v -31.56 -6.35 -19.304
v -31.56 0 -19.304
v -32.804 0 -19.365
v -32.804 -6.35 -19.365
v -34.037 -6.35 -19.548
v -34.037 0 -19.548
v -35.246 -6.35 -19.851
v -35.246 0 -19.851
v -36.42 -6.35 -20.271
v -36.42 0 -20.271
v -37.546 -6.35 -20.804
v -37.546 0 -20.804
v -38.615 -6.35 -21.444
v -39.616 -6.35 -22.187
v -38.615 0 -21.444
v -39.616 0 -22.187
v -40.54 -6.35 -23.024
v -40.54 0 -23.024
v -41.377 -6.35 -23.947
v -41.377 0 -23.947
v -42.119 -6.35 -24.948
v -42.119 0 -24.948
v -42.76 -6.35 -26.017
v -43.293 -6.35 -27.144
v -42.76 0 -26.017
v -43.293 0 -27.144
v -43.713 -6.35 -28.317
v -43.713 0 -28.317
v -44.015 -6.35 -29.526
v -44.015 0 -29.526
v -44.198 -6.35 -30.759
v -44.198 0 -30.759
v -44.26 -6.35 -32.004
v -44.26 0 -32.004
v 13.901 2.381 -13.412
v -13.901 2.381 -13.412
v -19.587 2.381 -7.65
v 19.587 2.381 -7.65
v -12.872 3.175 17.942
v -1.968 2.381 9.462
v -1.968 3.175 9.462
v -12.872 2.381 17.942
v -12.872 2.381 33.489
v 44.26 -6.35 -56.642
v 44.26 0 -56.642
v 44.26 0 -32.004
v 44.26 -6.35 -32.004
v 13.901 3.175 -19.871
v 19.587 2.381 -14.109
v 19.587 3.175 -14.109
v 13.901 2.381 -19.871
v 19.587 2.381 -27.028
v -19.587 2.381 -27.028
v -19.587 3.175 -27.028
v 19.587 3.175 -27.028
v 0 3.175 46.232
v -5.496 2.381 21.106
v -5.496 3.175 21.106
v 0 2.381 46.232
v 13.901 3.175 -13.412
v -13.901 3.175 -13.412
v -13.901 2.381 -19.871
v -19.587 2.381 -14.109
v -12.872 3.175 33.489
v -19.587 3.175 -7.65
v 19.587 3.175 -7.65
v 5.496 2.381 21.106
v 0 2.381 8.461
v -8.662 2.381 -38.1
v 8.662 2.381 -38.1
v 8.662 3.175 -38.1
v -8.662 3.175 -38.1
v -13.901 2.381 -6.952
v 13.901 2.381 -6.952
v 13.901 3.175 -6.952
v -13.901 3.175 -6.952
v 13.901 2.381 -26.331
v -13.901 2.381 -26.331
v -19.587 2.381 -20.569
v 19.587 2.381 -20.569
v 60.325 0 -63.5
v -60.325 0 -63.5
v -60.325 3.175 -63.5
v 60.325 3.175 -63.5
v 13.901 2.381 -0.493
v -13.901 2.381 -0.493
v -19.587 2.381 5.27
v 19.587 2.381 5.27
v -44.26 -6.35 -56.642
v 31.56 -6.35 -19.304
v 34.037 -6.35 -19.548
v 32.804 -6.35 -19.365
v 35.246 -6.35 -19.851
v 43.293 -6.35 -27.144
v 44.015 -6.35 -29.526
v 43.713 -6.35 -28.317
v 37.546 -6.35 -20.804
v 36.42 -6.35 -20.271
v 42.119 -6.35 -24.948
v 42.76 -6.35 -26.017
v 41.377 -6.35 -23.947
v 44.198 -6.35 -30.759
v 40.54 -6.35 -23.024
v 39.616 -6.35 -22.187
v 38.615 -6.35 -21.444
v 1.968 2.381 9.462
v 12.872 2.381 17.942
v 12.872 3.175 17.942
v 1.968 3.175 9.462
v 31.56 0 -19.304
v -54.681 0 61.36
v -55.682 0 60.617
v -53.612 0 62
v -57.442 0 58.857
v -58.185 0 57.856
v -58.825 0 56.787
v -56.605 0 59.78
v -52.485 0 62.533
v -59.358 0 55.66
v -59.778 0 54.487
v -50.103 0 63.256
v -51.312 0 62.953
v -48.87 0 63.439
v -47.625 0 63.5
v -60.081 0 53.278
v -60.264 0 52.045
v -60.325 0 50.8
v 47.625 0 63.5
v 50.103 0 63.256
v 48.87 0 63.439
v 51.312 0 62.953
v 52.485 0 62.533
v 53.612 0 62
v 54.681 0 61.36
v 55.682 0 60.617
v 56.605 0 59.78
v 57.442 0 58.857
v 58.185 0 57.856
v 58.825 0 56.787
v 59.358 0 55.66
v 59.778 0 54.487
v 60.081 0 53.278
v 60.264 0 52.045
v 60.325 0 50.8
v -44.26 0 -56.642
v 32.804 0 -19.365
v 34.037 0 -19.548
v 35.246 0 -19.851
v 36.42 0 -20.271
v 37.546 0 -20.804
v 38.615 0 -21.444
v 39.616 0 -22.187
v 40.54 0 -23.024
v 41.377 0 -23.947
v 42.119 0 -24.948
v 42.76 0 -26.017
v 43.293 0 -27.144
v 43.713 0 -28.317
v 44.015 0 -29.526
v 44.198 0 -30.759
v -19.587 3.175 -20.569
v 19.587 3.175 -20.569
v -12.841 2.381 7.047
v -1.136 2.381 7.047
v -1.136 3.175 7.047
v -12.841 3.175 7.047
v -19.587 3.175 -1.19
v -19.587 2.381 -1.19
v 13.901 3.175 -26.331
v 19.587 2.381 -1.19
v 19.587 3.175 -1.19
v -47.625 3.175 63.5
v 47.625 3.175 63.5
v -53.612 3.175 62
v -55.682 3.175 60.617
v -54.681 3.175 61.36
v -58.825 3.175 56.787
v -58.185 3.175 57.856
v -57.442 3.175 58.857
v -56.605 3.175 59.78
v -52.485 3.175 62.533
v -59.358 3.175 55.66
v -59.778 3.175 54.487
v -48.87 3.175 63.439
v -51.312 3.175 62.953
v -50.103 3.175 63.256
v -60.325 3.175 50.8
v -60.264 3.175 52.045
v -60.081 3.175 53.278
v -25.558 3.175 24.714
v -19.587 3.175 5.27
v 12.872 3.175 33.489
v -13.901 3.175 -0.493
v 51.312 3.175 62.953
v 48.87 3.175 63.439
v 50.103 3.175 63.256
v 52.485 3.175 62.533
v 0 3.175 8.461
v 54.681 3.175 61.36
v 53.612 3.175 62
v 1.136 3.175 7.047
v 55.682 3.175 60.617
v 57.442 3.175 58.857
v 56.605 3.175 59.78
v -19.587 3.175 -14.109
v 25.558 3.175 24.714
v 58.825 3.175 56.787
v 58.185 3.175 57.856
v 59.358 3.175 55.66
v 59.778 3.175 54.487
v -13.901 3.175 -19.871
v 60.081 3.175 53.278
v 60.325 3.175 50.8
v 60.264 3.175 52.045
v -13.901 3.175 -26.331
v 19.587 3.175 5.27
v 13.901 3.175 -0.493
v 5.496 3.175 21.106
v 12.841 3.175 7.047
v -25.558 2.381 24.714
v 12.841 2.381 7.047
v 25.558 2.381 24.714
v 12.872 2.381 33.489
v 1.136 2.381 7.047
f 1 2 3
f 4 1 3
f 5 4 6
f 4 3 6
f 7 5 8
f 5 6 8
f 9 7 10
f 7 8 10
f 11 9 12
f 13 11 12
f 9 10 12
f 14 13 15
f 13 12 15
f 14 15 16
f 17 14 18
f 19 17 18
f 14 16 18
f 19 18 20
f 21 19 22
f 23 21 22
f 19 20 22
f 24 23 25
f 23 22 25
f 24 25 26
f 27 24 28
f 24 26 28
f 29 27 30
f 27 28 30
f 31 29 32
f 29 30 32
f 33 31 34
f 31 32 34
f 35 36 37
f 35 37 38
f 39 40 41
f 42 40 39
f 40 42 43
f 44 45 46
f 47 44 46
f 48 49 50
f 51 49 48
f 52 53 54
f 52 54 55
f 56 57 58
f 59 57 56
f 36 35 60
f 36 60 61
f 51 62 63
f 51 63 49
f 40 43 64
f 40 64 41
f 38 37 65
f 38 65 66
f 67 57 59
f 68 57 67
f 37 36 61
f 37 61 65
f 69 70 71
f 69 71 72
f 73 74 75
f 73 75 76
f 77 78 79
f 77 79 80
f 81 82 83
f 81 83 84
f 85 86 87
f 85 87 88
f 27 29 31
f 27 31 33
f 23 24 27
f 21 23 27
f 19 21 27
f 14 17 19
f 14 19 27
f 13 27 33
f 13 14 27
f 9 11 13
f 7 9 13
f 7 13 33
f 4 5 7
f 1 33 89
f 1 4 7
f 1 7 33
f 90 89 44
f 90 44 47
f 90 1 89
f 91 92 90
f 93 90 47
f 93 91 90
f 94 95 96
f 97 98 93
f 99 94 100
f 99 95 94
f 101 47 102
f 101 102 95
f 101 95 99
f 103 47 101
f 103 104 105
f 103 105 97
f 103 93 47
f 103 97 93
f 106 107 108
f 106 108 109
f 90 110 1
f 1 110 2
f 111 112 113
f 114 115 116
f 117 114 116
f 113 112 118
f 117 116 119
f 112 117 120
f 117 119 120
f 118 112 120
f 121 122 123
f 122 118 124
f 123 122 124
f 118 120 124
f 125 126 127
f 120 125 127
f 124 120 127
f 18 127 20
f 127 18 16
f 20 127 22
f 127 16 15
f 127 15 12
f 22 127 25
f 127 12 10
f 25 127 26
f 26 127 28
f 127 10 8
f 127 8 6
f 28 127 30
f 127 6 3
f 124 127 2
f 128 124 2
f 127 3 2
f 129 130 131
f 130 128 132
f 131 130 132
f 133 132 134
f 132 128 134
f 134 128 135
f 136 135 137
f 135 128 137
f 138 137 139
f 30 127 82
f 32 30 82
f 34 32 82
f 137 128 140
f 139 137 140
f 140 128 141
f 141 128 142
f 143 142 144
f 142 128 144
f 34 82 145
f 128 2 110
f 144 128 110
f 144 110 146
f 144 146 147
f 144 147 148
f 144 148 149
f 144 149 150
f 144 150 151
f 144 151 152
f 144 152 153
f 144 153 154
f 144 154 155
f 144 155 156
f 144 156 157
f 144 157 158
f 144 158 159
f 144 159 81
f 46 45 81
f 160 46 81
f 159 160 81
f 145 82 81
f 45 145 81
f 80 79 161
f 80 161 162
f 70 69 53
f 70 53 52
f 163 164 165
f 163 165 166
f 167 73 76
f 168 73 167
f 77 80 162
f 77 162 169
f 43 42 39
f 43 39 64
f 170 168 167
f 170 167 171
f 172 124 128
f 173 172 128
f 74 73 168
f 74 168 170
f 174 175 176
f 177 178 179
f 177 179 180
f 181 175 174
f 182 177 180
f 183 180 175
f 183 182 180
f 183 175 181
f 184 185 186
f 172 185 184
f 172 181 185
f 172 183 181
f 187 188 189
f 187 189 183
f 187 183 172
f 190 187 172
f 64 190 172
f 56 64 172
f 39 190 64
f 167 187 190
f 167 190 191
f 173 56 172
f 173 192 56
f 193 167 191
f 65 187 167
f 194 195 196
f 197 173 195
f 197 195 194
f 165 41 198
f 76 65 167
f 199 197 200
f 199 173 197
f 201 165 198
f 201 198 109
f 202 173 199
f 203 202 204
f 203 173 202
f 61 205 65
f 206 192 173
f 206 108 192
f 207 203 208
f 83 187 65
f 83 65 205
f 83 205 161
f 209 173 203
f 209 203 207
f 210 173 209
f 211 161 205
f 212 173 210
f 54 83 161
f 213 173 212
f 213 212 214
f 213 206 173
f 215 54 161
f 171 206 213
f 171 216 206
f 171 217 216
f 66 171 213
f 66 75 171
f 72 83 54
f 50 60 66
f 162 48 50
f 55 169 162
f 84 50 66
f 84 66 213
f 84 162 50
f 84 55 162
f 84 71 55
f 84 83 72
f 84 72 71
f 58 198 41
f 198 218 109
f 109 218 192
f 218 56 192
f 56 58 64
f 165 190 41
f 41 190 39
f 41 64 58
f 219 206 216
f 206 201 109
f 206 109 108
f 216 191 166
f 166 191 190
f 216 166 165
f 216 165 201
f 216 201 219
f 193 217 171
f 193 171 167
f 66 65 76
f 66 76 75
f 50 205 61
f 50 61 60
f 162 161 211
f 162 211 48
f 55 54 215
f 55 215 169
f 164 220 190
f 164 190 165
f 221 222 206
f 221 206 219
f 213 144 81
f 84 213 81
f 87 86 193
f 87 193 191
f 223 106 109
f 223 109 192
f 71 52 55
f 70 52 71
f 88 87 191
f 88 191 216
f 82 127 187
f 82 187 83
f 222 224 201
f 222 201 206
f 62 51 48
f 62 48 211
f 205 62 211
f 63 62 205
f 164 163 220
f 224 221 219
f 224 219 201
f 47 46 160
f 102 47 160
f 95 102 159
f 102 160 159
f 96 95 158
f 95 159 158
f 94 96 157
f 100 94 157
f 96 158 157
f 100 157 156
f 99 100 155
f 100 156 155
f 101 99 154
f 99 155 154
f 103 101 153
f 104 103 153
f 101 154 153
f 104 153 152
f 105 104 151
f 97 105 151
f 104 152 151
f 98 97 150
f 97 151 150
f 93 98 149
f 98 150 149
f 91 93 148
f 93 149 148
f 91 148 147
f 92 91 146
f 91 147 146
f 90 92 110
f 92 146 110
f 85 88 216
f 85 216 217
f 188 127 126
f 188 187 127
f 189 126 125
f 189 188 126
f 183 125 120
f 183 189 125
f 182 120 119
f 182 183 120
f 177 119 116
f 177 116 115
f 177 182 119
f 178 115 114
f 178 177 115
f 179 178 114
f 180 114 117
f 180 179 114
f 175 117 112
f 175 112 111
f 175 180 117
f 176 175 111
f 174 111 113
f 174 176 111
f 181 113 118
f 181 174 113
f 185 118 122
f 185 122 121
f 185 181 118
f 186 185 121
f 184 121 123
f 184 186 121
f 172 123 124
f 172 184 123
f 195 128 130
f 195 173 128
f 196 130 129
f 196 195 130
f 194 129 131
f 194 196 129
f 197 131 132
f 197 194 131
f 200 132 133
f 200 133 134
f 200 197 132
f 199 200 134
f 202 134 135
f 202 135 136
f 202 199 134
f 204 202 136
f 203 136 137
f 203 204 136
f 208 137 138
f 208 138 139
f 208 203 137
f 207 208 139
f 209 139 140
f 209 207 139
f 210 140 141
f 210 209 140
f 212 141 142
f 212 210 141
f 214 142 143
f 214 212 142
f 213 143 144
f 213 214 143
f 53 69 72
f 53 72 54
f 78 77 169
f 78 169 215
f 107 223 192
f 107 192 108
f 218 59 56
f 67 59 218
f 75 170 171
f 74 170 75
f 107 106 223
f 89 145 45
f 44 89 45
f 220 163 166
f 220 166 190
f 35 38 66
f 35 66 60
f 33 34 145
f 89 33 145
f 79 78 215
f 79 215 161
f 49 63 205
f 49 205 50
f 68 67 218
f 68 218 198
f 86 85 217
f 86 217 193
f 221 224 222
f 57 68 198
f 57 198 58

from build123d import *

# Parameters (mm, degrees)
SKETCH1_W           = 120.65
SKETCH1_H           = 127
BOSS_EXTRUDE1_DEPTH = 3.175
FILLET1_R           = 12.7
BOSS_EXTRUDE2_DEPTH = 6.35
CUT_EXTRUDE1_START  = -0.79375
CUT_EXTRUDE1_DEPTH  = 0.79375


# Read off the part's stored shape, not the designer's step: Cut-Extrude1
with BuildPart() as part:
    # Sketch1 → Boss-Extrude1 (new body)
    with BuildSketch(Plane(origin=(0, 0, 0), x_dir=(1, 0, 0), z_dir=(0, 1, 0))):
        Rectangle(SKETCH1_W, SKETCH1_H)
    extrude(amount=BOSS_EXTRUDE1_DEPTH)

    # Fillet1
    fillet1_edges = [part.edges().sort_by_distance(p)[0] for p in [
        (60.325, 1.5875, 63.5),
        (-60.325, 1.5875, 63.5),
    ]]
    fillet(fillet1_edges, radius=FILLET1_R)

    # Sketch2 → Boss-Extrude2 (add)
    with BuildSketch(Plane.XZ):
        with BuildLine():
            Line((-44.2595, -32.004), (-44.2595, -56.642))
            Line((-44.2595, -56.642), (44.2595, -56.642))
            Line((44.2595, -56.642), (44.2595, -32.004))
            ThreePointArc((44.2595, -32.004), (40.539756121, -23.023743879), (31.5595, -19.304))
            Line((31.5595, -19.304), (-31.5595, -19.304))
            ThreePointArc((-31.5595, -19.304), (-40.539756121, -23.023743879), (-44.2595, -32.004))
        make_face()
    extrude(amount=BOSS_EXTRUDE2_DEPTH)

    # Cut-Extrude1 outline → Cut-Extrude1 (cut)
    with BuildSketch(Plane(origin=(0, 3.175, 0), x_dir=(1, 0, 0), z_dir=(0, 1, 0)).offset(CUT_EXTRUDE1_START)):
        Polygon((19.586934791, 20.568683014), (13.900914294, 26.330878533), (-13.900917809, 26.330878533), (-19.586938306, 20.568683014), align=None)
        Polygon((25.558154067, -24.714180755), (12.840680417, -7.047287084), (1.136138921, -7.047287084), align=None)
        Polygon((-25.558126027, -24.714180755), (-1.13611088, -7.047287084), (-12.840652376, -7.047287084), align=None)
        Polygon((12.872252496, -17.941870118), (1.967957375, -9.461750192), (12.872252496, -33.488756649), align=None)
        Polygon((19.586934791, 14.109110528), (13.900914294, 19.871337603), (-13.900917809, 19.871337603), (-19.586938306, 14.109110528), align=None)
        Polygon((19.586934791, 7.649569598), (13.900882739, 13.411796673), (-13.900886254, 13.411796673), (-19.586938306, 7.649569598), align=None)
        Polygon((19.586934791, 1.190028667), (13.900914294, 6.952224187), (-13.900917809, 6.952224187), (-19.586938306, 1.190028667), align=None)
        Polygon((19.586934791, -5.269543818), (13.900914294, 0.492683256), (-13.900917809, 0.492683256), (-19.586938306, -5.269543818), align=None)
        Polygon((0, -8.460639301), (-5.496493939, -21.106287094), (0, -46.231527771), (5.496493939, -21.106287094), align=None)
        Polygon((-1.967957374, -9.461750193), (-12.872252495, -17.941870118), (-12.872252495, -33.488756649), align=None)
        Polygon((8.661555888, 38.1), (-8.661555888, 38.1), (-19.58692752, 27.028231496), (19.58692752, 27.028231496), align=None)
    extrude(amount=CUT_EXTRUDE1_DEPTH, mode=Mode.SUBTRACT)


solid = part.part
